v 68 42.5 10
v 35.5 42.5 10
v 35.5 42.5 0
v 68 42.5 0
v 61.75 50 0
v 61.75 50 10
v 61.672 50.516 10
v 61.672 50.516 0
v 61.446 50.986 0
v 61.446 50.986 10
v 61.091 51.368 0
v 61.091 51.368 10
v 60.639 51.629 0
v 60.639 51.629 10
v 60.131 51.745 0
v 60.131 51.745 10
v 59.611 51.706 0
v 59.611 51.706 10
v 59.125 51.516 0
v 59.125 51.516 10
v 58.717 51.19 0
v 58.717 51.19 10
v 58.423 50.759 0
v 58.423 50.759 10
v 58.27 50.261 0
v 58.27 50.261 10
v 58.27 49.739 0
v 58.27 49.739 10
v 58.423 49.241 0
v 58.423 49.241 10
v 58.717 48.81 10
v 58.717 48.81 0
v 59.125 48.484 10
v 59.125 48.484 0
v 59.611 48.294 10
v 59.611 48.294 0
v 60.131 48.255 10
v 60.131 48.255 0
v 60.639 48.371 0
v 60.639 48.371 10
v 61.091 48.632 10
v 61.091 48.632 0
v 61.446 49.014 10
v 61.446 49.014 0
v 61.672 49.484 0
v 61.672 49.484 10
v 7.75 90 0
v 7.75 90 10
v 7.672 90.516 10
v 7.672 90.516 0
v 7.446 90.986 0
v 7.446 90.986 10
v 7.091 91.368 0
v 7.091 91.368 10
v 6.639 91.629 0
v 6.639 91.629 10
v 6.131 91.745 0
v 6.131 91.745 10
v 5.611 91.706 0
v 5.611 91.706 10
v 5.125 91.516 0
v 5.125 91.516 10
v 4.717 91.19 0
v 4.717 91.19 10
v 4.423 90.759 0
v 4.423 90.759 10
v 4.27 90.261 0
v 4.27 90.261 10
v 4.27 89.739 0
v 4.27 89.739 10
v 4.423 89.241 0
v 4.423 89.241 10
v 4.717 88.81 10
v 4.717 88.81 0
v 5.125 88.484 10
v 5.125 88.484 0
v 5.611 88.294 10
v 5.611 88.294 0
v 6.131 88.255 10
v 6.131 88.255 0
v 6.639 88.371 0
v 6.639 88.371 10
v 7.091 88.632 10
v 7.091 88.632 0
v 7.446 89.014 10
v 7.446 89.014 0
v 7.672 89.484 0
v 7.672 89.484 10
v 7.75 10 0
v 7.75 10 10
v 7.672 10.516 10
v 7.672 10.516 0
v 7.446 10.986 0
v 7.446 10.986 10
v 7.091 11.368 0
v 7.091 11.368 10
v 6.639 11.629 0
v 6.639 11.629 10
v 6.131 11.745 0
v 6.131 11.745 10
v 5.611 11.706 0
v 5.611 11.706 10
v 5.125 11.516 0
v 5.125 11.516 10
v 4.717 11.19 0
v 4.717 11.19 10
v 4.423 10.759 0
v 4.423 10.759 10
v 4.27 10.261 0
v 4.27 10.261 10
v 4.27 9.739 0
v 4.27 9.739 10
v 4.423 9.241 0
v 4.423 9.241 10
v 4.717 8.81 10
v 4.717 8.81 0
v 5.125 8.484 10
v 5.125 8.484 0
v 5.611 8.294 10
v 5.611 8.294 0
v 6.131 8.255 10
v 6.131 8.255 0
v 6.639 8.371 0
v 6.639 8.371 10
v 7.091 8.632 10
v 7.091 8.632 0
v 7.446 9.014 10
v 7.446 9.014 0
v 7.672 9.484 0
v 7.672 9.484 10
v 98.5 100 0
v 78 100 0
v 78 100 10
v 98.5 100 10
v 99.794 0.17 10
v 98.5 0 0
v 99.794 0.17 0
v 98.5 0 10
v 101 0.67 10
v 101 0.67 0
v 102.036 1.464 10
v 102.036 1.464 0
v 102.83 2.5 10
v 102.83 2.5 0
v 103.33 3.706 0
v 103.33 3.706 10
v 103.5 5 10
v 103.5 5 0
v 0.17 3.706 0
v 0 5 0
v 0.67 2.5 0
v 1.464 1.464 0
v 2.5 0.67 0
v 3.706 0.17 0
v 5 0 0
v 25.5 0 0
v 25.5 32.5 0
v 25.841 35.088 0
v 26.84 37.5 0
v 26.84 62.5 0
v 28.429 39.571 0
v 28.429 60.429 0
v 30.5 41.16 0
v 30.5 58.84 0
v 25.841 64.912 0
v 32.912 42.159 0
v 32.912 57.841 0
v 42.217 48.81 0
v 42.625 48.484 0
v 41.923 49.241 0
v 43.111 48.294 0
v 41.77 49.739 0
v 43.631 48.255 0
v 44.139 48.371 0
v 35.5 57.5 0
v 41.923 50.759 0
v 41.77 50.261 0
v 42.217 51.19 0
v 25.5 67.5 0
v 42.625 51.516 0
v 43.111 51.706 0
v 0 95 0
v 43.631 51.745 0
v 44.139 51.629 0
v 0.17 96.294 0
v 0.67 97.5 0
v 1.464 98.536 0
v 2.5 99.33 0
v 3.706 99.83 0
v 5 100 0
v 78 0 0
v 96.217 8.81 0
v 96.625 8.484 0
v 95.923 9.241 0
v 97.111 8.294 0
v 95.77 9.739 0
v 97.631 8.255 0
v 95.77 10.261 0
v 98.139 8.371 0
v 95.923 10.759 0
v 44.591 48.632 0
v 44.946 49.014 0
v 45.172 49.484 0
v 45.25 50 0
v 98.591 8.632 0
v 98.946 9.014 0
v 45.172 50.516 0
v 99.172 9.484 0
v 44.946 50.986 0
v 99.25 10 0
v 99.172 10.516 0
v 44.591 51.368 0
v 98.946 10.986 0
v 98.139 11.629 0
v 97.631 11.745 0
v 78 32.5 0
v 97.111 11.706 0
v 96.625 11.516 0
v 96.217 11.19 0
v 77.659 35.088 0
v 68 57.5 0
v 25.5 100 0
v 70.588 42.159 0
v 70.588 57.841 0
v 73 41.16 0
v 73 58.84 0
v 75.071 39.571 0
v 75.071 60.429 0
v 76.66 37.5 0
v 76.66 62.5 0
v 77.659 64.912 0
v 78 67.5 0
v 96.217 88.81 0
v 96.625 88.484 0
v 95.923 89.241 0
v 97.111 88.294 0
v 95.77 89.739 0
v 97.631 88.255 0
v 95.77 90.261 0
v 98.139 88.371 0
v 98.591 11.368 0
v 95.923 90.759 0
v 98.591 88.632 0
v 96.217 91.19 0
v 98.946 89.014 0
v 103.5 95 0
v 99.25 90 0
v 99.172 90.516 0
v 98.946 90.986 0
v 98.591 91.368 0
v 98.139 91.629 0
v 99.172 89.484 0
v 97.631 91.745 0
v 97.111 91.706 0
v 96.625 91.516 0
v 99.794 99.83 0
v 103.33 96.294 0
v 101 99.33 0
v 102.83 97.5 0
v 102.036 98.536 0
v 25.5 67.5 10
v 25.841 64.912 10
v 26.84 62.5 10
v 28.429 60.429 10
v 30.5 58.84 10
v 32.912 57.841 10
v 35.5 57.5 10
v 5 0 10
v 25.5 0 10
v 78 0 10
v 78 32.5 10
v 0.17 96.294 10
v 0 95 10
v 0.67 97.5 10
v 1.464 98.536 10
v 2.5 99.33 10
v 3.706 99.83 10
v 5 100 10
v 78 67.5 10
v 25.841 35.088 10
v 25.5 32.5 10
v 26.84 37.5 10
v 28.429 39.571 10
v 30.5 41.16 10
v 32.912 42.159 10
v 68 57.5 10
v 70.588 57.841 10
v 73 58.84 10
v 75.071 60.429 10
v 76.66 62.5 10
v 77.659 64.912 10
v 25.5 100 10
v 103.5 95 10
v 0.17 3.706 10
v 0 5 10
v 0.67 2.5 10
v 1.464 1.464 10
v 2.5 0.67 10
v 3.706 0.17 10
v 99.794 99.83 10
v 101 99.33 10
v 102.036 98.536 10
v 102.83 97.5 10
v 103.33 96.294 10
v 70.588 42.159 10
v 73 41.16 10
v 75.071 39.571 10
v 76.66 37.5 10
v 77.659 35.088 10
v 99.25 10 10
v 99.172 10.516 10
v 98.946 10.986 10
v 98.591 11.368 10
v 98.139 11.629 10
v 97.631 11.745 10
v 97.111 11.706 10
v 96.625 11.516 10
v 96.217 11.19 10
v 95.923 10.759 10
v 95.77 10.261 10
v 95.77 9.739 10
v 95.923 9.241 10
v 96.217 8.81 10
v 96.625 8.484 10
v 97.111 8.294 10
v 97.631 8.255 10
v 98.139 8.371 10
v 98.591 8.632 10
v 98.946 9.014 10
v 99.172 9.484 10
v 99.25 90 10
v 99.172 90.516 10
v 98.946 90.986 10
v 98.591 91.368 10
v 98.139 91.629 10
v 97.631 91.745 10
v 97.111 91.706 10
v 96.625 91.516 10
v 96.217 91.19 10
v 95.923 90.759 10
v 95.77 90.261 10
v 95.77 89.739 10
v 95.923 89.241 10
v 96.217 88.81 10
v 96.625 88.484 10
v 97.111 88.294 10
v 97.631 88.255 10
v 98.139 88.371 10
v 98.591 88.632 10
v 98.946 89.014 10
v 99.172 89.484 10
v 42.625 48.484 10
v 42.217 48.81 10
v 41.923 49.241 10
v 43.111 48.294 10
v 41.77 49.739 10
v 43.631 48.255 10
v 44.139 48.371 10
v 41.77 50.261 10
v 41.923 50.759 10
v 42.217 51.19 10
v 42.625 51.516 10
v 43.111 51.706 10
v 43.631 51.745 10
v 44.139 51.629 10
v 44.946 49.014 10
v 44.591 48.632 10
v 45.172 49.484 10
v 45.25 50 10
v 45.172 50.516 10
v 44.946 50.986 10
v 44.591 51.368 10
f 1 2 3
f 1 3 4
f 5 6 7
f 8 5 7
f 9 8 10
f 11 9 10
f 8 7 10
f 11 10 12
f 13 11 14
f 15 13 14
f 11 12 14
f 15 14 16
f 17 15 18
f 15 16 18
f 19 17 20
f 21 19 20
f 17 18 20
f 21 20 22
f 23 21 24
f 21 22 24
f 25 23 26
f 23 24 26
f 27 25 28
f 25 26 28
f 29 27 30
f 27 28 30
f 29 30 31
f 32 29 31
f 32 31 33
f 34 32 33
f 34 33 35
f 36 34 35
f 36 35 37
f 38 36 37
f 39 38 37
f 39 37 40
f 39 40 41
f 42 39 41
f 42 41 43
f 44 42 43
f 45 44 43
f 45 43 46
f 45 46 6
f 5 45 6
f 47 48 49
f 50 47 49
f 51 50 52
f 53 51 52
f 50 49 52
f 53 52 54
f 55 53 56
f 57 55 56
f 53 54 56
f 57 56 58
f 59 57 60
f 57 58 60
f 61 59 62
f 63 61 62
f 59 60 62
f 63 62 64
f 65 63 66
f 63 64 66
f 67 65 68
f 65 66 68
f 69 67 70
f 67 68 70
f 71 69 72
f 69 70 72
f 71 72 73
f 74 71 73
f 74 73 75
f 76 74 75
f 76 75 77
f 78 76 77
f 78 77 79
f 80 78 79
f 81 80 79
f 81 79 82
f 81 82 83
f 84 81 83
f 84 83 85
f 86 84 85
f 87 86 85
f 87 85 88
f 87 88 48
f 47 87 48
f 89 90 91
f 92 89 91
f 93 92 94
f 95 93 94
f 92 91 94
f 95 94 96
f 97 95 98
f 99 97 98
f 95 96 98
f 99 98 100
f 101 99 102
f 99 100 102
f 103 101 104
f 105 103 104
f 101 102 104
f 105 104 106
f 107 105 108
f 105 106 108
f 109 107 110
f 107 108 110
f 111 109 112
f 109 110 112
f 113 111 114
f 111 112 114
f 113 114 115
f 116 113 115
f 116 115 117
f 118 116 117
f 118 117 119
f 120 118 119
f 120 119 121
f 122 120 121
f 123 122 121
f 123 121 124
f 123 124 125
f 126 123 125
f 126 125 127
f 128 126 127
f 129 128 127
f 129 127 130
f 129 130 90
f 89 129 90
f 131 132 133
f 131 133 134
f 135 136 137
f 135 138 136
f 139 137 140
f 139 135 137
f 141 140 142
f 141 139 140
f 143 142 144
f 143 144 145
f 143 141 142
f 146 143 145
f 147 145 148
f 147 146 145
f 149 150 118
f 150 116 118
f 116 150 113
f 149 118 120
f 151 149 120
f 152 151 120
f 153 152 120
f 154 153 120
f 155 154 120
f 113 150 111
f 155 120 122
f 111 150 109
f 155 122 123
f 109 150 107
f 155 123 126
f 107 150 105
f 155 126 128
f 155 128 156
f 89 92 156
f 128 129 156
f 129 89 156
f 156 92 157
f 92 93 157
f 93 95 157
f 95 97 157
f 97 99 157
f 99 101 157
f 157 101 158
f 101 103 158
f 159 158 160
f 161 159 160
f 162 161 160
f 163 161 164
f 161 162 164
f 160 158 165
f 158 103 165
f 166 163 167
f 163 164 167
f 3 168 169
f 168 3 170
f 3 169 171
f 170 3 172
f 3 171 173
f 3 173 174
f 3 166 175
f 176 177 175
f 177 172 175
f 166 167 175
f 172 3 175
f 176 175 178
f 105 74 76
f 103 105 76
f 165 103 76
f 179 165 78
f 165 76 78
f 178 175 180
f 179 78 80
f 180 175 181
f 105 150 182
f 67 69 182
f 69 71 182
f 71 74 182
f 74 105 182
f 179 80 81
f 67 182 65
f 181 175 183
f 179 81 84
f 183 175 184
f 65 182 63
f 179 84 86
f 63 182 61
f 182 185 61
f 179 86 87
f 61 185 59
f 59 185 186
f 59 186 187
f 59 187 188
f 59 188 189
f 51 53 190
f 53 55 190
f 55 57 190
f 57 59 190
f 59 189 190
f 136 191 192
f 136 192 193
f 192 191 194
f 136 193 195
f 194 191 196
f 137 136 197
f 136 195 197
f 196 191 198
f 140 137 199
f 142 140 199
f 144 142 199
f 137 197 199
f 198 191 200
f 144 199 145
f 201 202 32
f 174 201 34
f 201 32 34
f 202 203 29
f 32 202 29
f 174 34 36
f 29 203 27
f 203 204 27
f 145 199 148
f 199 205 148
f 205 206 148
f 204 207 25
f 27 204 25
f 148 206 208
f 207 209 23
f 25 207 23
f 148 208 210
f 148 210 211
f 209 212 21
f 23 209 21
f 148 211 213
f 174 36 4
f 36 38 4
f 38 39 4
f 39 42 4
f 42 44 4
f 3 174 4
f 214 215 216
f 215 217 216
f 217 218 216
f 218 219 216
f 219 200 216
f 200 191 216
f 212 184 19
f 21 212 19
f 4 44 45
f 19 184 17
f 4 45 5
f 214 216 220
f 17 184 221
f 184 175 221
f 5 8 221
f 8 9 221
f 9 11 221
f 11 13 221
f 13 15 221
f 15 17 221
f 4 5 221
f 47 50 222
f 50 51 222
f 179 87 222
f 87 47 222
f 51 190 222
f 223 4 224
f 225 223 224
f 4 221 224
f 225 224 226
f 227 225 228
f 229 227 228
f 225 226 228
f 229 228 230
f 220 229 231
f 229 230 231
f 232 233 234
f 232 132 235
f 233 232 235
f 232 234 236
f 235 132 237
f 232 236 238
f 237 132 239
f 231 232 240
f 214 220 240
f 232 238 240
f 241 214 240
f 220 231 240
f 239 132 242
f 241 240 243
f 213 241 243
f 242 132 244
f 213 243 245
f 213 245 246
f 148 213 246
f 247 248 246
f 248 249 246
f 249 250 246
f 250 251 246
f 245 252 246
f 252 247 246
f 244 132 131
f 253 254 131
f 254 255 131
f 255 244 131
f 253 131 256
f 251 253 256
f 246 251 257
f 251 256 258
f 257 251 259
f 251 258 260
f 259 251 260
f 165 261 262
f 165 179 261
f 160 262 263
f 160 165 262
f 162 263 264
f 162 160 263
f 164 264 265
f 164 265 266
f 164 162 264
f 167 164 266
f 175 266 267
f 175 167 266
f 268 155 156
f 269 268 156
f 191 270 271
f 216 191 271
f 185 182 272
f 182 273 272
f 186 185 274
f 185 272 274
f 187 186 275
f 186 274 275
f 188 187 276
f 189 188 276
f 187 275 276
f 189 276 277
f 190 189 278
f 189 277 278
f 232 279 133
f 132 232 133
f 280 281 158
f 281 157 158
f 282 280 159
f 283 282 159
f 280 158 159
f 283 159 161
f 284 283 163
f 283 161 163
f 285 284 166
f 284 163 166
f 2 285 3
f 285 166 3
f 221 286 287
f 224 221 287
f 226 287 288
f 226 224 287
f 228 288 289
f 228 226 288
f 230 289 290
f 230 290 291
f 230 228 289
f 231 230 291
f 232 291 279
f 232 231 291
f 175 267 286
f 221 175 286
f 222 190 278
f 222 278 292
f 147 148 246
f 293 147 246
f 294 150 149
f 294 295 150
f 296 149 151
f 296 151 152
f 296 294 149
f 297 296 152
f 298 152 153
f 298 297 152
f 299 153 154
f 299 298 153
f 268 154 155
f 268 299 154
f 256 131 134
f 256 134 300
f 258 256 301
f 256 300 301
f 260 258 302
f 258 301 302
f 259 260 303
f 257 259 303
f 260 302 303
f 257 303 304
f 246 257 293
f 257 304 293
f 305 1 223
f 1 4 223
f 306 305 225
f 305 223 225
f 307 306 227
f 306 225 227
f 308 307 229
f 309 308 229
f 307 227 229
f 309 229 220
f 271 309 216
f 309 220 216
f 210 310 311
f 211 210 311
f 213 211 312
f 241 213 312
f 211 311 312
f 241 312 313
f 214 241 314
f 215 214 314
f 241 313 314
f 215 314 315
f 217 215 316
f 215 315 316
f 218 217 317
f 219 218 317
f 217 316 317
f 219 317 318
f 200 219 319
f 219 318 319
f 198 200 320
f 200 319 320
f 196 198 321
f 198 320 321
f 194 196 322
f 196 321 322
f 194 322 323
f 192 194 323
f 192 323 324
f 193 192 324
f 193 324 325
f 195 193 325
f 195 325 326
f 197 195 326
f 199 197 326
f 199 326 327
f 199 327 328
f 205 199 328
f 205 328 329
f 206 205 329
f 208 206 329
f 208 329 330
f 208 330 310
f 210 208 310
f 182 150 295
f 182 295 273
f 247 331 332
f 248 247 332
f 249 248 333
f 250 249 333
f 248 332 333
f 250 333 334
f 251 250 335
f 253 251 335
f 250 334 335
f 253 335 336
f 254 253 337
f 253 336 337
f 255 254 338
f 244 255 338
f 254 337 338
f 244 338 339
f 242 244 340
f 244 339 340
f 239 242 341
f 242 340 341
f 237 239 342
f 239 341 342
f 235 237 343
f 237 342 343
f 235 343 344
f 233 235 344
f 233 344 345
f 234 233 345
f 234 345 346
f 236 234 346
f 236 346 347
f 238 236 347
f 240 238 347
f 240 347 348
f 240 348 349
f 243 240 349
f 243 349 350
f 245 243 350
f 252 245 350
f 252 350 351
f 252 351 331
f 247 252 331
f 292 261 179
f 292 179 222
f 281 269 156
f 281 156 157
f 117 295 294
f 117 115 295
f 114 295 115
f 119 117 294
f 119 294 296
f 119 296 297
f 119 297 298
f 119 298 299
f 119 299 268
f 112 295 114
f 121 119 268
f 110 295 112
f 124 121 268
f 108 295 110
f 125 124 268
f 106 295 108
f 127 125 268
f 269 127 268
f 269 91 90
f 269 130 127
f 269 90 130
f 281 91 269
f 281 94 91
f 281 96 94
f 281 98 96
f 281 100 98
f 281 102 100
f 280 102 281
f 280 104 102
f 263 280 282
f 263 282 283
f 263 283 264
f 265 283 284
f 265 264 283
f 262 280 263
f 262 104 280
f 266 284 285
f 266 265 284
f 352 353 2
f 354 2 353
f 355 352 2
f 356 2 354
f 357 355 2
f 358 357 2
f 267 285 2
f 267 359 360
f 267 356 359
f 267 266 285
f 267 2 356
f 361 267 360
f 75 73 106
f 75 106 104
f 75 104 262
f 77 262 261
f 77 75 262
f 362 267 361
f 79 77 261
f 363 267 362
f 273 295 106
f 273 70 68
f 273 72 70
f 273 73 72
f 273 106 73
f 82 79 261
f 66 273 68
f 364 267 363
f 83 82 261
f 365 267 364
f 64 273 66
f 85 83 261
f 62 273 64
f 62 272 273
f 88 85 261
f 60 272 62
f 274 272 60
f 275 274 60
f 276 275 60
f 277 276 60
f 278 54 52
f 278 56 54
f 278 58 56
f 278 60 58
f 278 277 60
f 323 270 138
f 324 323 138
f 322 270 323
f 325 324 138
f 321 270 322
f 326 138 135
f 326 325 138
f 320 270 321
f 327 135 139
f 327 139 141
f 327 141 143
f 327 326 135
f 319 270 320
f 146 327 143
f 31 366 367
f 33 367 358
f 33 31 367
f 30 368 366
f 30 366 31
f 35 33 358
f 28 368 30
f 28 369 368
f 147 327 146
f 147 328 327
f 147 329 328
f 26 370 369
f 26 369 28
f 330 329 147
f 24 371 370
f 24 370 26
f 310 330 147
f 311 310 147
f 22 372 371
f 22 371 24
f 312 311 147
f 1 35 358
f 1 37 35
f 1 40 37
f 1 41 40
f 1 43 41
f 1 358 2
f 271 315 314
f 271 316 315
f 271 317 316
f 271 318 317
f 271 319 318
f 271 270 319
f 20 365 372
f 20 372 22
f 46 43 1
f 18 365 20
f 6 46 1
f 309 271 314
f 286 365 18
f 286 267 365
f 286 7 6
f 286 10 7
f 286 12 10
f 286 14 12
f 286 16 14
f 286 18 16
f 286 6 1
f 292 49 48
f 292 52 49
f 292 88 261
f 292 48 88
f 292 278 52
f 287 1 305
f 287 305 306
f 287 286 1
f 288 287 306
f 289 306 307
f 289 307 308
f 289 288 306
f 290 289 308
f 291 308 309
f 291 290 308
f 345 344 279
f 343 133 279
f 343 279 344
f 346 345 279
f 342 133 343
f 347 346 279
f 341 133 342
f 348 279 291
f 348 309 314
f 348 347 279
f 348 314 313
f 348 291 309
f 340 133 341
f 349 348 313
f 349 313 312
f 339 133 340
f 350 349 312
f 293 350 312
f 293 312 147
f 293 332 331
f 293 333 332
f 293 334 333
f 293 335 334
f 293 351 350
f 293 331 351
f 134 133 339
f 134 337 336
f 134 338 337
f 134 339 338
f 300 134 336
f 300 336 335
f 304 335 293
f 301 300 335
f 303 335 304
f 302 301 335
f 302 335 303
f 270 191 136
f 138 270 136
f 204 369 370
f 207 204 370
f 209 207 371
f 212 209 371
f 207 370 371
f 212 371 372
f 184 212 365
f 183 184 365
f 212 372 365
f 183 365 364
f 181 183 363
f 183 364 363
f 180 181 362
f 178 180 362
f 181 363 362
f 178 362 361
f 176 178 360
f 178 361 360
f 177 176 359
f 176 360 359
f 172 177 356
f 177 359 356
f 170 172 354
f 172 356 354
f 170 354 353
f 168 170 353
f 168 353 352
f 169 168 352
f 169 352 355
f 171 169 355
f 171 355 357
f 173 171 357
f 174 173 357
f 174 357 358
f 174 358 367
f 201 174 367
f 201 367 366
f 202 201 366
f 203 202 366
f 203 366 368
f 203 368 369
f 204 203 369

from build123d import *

# Parameters (mm, degrees)
SKETCH_W        = 103.5
SKETCH_H        = 100
PAD_DEPTH       = 10
SKETCH001_W     = 52.5
SKETCH001_H     = 42.5
POCKET_DEPTH    = 10.001
SKETCH002_R     = 1.75
POCKET001_DEPTH = 10.001
FILLET_R        = 5
FILLET001_R     = 10


with BuildPart() as part:
    # Sketch → Pad (new body)
    with BuildSketch(Plane.XY):
        with Locations((51.75, 50)):
            Rectangle(SKETCH_W, SKETCH_H)
    extrude(amount=PAD_DEPTH)

    # Sketch001 (on Face6 of Pad) → Pocket (cut, through all)
    with BuildSketch(Plane.XY.offset(10)):
        with Locations((51.75, 78.75)):
            Rectangle(SKETCH001_W, SKETCH001_H)
        with Locations((51.75, 21.25)):
            Rectangle(SKETCH001_W, SKETCH001_H)
    extrude(amount=-POCKET_DEPTH, mode=Mode.SUBTRACT)

    # Sketch002 (on Face4 of Pocket) → Pocket001 (cut, through all)
    with BuildSketch(Plane.XY.offset(10)):
        with Locations((6, 90)):
            Circle(SKETCH002_R)
        with Locations((6, 10)):
            Circle(SKETCH002_R)
        with Locations((43.5, 50)):
            Circle(SKETCH002_R)
        with Locations((97.5, 90)):
            Circle(SKETCH002_R)
        with Locations((97.5, 10)):
            Circle(SKETCH002_R)
        with Locations((60, 50)):
            Circle(SKETCH002_R)
    extrude(amount=-POCKET001_DEPTH, mode=Mode.SUBTRACT)

    # Fillet
    fillet_edges = [part.edges().sort_by_distance(p)[0] for p in [
        (0, 100, 5),
        (0, 0, 5),
        (103.5, 0, 5),
        (103.5, 100, 5),
    ]]
    fillet(fillet_edges, radius=FILLET_R)

    # Fillet001
    fillet001_edges = [part.edges().sort_by_distance(p)[0] for p in [
        (78, 57.5, 5),
        (25.5, 42.5, 5),
        (25.5, 57.5, 5),
        (78, 42.5, 5),
    ]]
    fillet(fillet001_edges, radius=FILLET001_R)


solid = part.part
